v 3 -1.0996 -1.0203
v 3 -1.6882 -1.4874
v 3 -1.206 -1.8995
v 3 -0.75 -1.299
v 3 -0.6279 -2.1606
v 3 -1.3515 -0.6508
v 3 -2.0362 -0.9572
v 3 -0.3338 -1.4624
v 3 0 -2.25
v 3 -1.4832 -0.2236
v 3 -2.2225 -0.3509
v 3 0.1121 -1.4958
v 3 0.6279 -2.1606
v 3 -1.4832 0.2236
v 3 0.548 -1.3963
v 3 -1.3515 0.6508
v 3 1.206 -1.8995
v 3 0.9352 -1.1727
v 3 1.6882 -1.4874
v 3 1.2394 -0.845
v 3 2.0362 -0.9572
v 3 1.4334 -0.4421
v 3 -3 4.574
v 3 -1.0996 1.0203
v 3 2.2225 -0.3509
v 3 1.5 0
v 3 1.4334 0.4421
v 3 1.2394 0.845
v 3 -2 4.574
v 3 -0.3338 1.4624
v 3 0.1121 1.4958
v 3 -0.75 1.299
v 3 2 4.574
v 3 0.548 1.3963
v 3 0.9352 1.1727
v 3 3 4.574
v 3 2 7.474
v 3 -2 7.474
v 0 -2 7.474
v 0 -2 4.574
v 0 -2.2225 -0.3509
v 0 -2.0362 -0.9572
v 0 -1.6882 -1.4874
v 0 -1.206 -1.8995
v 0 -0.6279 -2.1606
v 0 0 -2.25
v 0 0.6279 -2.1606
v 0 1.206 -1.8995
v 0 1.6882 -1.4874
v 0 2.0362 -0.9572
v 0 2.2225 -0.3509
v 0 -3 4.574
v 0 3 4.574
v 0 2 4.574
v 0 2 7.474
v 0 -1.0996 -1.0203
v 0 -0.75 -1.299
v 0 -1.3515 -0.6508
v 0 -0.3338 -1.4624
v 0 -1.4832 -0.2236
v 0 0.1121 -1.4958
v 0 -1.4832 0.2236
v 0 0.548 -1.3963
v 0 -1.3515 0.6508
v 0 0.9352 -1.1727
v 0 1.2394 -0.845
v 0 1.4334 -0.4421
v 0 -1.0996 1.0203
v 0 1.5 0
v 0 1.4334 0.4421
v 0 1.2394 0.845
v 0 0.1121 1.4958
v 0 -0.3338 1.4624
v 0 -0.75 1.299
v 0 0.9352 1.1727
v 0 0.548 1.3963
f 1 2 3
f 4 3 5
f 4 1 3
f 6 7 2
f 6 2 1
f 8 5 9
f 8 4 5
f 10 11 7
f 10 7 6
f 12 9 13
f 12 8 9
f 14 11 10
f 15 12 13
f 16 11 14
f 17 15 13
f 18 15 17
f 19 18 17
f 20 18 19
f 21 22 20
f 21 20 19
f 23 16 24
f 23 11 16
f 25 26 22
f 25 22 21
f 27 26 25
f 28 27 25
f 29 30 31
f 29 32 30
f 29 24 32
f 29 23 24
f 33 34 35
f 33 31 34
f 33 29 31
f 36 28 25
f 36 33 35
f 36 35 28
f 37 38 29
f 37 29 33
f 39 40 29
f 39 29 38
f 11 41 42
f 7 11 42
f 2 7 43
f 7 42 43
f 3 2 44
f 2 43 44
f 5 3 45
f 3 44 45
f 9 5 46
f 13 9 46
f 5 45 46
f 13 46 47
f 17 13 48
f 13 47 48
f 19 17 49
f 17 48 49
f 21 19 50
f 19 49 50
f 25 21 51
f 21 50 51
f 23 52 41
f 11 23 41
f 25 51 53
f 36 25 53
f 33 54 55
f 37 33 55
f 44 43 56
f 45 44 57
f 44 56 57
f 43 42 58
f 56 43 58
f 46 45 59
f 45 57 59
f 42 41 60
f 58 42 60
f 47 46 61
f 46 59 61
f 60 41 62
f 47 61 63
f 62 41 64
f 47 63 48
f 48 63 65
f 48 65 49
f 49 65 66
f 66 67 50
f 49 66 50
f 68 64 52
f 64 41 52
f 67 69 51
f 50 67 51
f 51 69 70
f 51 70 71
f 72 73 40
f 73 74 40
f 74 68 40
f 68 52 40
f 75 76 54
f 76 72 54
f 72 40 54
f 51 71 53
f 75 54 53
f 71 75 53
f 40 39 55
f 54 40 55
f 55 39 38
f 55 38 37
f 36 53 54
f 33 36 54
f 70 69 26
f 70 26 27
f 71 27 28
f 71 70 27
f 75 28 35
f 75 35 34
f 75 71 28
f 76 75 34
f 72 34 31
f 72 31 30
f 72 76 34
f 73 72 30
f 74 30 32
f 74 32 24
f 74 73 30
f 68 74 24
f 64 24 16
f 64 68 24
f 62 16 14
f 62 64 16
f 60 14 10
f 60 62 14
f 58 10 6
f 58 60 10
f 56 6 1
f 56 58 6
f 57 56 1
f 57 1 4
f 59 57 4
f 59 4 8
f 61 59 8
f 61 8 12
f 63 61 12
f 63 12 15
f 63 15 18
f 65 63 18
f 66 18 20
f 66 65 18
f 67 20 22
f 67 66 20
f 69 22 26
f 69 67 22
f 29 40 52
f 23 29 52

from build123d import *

# Parameters (mm, degrees)
F0_R     = 1.5
F0_W     = 4
F0_H     = 2.9
F1_DEPTH = 3


with BuildPart() as f1:
    # F0 (on Right) → F1 (new body)
    with BuildSketch(Plane.YZ):
        with BuildLine():
            ThreePointArc((2.222473, -0.350876), (2.243108, -0.175977), (2.25, 0))
            ThreePointArc((2.25, 0), (-0.175977, 2.243108), (-2.222473, -0.350876))
            ThreePointArc((-2.222473, -0.350876), (0, -2.25), (2.222473, -0.350876))
        make_face()
        Circle(F0_R, mode=Mode.SUBTRACT)
        with BuildLine():
            ThreePointArc((-2.222473, -0.350876), (-0.175977, 2.243108), (2.25, 0))
            ThreePointArc((2.25, 0), (2.243108, -0.175977), (2.222473, -0.350876))
            Line((2.222473, -0.350876), (3, 4.574038))
            Line((3, 4.574038), (2, 4.574038))
            Line((2, 4.574038), (-2, 4.574038))
            Line((-2, 4.574038), (-3, 4.574038))
            Line((-3, 4.574038), (-2.222473, -0.350876))
        make_face()
        with Locations((0, 6.024038)):
            Rectangle(F0_W, F0_H)
    extrude(amount=F1_DEPTH)


solid = f1.part
